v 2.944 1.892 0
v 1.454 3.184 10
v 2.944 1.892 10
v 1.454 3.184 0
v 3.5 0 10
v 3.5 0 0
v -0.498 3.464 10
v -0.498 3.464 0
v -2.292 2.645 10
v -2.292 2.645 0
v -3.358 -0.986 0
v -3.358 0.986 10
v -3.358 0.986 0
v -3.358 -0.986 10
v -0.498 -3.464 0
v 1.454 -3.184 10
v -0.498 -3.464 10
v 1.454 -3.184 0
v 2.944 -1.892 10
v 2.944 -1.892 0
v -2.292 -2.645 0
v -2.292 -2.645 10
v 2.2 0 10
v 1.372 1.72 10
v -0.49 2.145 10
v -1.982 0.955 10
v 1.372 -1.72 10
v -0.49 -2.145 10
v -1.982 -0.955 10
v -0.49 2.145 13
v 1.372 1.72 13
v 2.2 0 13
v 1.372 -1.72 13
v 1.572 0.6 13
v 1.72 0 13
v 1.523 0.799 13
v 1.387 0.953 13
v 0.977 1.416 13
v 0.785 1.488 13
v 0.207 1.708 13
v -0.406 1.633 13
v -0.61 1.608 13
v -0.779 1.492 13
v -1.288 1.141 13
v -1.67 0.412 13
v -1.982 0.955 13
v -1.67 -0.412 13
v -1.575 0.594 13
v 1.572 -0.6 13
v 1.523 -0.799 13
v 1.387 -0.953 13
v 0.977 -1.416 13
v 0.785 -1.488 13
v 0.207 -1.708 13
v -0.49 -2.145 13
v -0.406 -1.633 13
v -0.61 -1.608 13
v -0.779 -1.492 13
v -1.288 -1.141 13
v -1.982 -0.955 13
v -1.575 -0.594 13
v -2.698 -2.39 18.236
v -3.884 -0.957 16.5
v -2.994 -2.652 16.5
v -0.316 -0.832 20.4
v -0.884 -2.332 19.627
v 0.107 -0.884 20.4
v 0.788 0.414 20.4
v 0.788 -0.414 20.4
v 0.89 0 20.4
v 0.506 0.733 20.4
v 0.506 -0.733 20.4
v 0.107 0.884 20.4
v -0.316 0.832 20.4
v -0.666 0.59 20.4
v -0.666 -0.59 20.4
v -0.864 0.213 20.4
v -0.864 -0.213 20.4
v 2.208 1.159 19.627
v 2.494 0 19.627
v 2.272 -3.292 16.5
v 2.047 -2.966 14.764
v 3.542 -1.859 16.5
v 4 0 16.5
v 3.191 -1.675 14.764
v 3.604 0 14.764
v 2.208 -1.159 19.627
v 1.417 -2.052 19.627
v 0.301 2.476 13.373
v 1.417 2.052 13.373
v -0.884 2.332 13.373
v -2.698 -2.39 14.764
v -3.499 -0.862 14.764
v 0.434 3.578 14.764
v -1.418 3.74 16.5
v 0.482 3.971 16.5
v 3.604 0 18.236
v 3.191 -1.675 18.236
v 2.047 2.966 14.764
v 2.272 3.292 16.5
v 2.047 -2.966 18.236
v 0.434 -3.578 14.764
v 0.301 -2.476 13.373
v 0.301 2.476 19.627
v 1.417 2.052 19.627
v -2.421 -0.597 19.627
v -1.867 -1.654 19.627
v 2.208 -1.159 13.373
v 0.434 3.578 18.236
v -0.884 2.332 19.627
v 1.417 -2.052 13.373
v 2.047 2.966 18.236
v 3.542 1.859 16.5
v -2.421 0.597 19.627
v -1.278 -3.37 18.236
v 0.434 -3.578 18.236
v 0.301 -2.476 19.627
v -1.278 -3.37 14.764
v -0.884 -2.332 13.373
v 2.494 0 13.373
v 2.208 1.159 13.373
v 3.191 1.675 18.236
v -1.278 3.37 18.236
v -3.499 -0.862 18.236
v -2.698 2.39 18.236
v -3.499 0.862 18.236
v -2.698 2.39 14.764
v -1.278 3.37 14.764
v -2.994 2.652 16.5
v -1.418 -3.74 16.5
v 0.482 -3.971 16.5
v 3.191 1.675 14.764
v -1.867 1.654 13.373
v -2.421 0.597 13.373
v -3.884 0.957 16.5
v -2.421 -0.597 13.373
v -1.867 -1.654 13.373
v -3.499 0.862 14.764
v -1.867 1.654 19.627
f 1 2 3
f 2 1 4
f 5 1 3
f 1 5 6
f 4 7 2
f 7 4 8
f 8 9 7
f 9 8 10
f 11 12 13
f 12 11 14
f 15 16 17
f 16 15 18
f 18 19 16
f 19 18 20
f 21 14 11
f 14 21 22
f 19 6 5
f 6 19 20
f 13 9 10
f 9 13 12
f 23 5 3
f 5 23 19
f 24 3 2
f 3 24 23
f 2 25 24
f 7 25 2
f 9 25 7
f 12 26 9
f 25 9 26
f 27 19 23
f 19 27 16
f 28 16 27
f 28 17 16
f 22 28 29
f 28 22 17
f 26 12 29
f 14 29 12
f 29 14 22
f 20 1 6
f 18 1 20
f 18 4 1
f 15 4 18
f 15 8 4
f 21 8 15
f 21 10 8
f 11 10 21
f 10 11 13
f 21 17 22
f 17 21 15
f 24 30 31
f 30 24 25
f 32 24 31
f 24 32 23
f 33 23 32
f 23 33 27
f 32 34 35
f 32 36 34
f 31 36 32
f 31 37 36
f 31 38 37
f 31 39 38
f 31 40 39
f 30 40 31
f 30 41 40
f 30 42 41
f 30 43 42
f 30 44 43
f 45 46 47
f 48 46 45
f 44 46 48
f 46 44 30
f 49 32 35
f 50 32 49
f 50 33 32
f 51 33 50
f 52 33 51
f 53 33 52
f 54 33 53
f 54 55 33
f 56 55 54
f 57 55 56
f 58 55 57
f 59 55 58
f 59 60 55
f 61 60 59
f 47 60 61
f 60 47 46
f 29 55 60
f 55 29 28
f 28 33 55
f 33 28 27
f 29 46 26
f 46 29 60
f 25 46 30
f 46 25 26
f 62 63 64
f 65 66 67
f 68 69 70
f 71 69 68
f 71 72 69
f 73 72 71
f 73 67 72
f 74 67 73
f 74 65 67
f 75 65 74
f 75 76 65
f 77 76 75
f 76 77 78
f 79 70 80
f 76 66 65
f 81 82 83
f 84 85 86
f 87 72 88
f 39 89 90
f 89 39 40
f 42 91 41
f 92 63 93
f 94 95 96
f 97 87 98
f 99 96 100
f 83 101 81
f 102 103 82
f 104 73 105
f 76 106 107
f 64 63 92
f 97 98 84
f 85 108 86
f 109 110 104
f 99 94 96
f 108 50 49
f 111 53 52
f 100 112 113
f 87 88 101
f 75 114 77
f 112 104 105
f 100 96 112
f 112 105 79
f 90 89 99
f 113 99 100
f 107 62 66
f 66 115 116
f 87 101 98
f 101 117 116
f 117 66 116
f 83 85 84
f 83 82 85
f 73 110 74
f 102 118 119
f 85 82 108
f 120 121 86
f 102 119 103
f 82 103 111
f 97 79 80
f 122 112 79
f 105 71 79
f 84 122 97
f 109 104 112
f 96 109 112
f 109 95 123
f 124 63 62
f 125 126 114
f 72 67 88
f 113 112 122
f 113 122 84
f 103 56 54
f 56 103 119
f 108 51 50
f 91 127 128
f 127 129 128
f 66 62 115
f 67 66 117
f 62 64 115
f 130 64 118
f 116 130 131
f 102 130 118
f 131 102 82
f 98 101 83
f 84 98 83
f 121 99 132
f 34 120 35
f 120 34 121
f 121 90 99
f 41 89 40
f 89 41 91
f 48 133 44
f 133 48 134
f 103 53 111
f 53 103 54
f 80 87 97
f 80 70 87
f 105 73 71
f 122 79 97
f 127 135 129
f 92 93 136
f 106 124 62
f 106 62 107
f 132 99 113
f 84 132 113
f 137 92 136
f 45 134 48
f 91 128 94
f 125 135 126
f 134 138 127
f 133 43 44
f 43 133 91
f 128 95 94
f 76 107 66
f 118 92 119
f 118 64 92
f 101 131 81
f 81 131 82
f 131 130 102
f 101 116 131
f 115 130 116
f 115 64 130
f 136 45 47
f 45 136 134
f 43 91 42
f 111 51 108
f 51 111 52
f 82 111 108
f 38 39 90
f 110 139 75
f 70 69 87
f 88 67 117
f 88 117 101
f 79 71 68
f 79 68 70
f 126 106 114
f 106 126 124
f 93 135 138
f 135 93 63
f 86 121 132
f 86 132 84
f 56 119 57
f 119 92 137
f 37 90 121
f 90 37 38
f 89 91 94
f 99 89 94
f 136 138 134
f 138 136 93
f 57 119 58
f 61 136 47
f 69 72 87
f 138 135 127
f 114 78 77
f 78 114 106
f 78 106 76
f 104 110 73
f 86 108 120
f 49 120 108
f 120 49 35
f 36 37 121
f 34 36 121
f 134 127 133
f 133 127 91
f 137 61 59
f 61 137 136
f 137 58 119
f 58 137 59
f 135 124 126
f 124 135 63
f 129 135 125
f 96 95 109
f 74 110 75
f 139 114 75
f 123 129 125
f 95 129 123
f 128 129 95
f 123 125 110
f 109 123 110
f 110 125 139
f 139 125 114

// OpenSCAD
union()  {
cylinder(r=3.5,h=10.0);
translate([0.0,0.0,10.0])cylinder(r=2.2,h=3.0);
translate([0.0,0.0,16.5])sphere(r = 4.0);
}
